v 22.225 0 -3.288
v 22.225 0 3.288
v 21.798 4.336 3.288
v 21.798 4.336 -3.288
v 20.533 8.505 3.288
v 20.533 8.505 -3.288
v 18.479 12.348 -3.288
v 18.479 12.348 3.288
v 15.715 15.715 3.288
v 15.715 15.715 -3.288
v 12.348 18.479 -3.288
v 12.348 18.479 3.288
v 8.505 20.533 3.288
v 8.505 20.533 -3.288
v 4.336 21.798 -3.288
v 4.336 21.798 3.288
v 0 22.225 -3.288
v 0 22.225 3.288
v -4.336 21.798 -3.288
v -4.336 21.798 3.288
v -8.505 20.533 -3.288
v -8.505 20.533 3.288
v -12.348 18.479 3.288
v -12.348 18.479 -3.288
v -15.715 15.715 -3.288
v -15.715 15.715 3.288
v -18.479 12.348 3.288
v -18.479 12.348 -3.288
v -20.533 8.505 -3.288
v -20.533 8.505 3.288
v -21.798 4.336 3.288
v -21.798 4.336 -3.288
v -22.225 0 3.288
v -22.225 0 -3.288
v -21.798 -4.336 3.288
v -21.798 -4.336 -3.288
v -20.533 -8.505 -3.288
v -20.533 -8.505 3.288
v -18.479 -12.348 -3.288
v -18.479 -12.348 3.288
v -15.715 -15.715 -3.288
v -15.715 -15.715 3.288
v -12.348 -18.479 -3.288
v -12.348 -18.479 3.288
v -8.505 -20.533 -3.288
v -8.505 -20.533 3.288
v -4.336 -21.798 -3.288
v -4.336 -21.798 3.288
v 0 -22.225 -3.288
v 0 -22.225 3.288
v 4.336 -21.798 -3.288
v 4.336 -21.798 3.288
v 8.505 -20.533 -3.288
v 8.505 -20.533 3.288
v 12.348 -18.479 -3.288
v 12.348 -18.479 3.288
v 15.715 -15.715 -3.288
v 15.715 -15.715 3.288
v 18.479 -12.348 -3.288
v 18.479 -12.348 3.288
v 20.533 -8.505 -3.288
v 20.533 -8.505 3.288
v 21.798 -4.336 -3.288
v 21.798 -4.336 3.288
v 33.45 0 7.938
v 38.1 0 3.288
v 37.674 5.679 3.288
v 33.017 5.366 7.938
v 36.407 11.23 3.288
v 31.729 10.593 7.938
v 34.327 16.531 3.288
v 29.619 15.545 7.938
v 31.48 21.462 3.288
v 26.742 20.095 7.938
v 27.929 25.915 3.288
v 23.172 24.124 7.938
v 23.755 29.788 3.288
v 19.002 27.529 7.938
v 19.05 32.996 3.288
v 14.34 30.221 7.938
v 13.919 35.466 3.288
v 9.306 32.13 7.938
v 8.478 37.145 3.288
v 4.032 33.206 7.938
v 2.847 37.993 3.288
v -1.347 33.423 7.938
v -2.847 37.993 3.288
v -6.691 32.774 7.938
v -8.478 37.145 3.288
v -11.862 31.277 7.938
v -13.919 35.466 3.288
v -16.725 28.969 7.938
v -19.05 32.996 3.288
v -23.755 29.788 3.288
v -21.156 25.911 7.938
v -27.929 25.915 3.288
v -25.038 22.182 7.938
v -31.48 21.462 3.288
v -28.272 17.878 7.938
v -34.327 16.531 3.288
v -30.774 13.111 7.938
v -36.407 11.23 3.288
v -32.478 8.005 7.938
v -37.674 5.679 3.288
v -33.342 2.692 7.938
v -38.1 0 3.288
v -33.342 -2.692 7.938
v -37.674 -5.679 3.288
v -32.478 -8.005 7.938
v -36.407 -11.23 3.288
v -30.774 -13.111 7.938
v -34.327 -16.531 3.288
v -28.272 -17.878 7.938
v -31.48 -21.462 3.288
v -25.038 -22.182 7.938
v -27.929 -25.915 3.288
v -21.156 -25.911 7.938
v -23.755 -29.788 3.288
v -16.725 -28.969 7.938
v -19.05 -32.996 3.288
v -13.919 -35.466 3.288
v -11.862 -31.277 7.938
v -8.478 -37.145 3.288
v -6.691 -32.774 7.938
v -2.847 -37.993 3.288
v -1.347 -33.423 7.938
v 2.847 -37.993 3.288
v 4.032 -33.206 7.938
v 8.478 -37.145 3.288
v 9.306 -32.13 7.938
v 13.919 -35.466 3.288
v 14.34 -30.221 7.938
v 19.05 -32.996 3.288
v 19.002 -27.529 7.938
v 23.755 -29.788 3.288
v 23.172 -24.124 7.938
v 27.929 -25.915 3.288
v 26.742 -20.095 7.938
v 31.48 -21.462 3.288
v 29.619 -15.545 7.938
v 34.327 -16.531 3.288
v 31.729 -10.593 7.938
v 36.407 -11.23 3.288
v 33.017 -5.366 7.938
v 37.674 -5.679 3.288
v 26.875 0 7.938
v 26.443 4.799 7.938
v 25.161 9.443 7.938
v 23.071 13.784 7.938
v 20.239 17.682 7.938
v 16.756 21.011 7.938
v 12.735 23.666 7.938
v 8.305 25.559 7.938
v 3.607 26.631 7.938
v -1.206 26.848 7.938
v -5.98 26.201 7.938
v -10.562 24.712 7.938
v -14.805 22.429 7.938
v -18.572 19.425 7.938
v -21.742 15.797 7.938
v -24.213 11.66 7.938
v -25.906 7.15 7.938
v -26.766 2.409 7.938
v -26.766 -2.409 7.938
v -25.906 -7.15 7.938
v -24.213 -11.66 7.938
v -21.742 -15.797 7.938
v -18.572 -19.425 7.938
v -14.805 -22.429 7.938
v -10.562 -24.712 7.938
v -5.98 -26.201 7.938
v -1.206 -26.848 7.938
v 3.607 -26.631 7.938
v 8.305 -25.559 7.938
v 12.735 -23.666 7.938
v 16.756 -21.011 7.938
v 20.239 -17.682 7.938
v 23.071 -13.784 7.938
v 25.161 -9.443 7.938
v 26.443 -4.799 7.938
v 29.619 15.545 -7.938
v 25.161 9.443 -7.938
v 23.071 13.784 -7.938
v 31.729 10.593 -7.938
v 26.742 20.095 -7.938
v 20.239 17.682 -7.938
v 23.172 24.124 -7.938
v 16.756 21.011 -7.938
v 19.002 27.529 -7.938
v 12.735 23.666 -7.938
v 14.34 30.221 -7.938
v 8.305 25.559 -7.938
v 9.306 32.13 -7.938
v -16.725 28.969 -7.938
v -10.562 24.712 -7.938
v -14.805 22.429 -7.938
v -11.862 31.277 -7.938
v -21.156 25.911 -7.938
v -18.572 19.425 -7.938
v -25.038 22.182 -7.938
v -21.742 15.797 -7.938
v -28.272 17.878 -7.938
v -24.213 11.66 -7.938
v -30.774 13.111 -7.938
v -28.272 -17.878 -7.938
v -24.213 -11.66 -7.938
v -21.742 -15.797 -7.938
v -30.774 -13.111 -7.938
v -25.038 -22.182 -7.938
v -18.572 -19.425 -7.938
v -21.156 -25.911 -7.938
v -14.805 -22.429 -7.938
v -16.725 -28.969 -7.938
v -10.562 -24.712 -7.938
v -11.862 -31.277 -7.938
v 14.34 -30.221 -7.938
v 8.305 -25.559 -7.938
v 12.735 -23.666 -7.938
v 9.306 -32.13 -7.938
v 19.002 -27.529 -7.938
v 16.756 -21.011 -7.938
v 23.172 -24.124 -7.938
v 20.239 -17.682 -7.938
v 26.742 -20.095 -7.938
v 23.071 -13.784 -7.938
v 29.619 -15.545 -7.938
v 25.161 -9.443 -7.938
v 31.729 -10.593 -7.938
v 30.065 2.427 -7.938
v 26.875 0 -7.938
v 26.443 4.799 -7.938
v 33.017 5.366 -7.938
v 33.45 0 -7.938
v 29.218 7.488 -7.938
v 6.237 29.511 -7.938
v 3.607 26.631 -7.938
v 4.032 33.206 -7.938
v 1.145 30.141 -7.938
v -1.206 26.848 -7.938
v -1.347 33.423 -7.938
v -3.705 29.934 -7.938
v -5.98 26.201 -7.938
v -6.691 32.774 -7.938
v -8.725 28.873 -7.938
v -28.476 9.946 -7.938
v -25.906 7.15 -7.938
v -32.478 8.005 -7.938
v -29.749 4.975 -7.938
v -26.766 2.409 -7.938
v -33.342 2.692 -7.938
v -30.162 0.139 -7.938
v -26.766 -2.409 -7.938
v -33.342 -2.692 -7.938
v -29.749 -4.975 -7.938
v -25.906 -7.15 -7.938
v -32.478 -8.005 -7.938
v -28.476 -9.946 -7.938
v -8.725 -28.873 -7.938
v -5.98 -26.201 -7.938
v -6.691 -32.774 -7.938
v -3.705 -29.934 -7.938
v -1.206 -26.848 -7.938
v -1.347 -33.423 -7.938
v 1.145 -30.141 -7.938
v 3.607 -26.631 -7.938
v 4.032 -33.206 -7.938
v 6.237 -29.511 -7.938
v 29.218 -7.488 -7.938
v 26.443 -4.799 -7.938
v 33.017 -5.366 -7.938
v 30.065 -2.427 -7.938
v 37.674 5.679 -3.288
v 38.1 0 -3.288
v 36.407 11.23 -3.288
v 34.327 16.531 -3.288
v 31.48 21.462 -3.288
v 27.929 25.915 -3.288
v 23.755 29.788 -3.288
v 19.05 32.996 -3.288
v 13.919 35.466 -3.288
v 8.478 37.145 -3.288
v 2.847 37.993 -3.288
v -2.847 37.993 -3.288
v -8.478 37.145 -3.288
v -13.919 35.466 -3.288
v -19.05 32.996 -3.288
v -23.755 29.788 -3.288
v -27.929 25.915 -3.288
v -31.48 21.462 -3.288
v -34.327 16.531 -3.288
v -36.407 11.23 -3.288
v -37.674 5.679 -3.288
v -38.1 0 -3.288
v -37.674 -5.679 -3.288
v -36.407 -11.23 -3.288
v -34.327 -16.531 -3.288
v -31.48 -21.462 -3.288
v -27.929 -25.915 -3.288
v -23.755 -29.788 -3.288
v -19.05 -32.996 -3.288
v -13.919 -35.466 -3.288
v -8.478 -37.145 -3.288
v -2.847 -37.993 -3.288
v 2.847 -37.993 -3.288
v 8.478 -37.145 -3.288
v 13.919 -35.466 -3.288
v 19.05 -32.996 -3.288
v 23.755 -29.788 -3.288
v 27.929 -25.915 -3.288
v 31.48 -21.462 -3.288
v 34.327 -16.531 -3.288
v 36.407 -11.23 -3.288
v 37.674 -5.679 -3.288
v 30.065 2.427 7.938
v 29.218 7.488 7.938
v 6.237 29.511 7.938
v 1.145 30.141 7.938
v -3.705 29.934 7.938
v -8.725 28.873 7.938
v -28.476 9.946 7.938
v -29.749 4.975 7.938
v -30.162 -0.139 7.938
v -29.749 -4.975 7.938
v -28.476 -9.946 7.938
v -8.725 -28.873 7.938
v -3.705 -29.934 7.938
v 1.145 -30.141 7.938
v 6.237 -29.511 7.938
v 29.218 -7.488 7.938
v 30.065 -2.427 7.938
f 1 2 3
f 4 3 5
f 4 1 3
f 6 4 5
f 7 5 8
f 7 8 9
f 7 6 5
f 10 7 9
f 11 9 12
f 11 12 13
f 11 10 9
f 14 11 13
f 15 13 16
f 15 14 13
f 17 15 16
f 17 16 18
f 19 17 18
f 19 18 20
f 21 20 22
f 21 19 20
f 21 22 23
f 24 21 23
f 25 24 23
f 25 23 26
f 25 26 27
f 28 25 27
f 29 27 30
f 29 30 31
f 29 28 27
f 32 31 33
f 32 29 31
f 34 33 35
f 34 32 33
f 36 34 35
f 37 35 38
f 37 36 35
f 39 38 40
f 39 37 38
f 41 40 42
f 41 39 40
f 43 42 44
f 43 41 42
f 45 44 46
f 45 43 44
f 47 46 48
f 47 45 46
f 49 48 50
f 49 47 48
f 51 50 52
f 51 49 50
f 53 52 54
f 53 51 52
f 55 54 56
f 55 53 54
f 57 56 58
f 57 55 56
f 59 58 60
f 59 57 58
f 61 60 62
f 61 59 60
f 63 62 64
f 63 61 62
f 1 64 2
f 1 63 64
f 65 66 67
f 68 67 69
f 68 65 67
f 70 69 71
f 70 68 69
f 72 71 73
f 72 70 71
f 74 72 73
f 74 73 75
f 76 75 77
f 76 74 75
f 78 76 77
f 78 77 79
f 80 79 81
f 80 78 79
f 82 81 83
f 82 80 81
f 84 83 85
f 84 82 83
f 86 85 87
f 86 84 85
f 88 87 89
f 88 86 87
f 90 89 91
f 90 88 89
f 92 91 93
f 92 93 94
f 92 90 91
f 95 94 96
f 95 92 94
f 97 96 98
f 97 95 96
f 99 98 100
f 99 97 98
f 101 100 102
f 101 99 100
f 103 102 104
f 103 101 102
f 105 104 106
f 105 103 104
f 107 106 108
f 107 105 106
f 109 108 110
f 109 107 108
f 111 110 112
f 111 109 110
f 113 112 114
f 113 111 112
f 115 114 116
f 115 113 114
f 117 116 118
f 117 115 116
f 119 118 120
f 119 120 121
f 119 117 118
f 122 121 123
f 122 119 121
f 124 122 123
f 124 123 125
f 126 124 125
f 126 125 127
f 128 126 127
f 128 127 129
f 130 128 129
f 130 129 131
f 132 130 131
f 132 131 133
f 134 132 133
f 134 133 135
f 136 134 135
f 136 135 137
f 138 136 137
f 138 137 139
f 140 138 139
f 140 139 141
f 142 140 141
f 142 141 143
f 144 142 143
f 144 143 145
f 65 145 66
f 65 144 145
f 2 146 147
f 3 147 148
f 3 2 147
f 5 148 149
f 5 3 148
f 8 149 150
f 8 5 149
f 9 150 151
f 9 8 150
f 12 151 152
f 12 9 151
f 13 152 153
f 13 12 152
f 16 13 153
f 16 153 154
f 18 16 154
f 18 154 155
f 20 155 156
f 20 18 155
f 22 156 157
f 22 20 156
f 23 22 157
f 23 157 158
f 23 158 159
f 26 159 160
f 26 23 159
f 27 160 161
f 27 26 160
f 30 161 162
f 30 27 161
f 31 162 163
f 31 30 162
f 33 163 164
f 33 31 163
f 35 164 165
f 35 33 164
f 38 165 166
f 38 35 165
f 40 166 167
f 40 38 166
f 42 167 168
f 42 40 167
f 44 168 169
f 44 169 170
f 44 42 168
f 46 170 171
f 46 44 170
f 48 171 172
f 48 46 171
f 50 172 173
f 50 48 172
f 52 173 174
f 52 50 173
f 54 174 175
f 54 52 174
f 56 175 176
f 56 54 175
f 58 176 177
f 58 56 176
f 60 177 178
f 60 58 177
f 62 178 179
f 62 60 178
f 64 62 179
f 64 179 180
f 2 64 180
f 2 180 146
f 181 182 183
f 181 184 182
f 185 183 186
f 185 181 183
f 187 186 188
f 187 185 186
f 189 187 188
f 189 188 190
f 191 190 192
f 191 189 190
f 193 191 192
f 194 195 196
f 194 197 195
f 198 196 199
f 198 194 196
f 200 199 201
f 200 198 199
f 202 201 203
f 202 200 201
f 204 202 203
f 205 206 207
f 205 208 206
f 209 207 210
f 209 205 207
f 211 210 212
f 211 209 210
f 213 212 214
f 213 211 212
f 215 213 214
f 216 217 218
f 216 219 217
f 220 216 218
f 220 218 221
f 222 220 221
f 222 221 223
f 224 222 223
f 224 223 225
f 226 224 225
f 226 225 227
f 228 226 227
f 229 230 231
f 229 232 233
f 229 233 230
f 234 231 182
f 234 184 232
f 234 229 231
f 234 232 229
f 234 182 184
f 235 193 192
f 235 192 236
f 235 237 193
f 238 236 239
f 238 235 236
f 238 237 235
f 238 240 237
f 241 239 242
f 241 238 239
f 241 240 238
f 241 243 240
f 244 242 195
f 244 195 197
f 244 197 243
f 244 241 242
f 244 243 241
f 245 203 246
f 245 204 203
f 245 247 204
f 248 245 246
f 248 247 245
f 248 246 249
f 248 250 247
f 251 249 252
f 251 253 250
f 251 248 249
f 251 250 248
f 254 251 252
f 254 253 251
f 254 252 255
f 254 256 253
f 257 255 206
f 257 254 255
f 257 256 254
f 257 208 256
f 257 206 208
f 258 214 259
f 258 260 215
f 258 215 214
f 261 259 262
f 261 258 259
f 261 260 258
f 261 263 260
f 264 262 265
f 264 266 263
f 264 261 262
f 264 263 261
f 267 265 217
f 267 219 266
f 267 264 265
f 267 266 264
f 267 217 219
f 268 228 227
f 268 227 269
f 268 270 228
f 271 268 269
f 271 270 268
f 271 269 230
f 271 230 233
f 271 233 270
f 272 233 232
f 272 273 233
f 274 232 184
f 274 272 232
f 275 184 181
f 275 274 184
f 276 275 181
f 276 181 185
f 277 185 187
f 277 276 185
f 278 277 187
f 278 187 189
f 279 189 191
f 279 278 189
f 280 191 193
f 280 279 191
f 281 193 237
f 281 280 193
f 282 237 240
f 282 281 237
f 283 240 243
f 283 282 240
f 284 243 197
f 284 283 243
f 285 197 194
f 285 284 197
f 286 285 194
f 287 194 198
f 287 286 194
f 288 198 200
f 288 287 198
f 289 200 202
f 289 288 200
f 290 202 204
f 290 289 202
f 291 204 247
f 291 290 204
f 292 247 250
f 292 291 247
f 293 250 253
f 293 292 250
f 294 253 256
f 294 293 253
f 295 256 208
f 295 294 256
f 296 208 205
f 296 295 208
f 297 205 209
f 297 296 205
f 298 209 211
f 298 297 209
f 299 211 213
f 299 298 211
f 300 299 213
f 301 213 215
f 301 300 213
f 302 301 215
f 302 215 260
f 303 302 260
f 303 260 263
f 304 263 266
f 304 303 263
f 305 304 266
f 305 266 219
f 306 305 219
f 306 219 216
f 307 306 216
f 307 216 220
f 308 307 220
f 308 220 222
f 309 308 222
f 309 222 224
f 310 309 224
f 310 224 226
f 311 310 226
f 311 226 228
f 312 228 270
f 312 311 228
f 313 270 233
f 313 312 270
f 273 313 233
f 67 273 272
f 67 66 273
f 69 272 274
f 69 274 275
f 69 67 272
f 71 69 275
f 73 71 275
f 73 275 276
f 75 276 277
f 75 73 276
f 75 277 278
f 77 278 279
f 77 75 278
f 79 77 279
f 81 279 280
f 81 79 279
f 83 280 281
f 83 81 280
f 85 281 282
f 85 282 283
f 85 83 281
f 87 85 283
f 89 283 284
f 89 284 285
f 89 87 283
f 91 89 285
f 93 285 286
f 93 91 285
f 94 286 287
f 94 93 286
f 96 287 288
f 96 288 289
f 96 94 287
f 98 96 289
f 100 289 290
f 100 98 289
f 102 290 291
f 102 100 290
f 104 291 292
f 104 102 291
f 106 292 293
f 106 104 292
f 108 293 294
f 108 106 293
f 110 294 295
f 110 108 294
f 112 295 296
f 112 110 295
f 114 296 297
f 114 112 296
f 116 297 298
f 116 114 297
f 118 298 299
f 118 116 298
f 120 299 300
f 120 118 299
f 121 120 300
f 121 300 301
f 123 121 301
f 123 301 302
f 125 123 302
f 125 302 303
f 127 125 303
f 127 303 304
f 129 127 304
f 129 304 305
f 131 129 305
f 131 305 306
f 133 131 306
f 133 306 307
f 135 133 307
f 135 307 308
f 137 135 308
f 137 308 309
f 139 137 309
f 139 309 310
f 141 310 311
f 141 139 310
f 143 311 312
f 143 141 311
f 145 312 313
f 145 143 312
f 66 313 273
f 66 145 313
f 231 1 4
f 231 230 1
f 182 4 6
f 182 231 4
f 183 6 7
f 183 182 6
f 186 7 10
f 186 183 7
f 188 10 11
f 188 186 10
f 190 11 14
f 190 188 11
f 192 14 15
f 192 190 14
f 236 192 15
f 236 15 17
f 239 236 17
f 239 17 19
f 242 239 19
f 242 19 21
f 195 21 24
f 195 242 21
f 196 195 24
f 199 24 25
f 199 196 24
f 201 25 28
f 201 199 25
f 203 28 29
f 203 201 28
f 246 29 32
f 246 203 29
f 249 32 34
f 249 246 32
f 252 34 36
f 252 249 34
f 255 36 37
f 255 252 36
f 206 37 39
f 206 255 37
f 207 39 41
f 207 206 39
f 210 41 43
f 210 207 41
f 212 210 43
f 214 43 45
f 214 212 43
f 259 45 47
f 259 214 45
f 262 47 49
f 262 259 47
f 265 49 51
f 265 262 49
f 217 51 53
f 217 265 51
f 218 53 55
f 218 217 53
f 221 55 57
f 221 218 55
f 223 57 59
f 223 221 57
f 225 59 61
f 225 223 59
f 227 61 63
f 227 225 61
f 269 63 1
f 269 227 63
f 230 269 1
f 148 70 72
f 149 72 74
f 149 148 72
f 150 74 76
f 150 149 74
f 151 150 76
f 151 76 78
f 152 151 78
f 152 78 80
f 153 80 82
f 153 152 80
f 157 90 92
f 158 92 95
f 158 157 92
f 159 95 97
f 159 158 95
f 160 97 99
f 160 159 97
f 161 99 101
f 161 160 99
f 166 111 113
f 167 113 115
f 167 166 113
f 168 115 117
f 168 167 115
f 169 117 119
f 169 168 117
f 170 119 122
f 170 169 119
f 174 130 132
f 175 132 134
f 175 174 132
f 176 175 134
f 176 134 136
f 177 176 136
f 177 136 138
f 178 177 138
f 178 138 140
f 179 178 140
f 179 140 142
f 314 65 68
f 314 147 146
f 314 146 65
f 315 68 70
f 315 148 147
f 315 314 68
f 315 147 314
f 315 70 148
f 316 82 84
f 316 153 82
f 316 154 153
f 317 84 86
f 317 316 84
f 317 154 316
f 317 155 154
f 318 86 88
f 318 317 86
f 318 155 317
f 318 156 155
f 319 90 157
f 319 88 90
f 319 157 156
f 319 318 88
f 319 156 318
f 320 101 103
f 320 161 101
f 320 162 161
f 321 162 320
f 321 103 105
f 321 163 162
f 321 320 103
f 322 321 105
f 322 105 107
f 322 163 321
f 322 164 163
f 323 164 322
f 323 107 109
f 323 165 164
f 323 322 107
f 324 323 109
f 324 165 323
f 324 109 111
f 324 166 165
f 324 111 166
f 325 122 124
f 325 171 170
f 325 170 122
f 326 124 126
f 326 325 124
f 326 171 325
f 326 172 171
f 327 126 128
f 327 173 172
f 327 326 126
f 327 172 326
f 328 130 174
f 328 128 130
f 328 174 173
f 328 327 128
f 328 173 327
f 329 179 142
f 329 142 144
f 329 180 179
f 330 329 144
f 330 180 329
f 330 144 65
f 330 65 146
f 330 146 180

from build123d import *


with BuildPart() as f2:
    # F2: sweep along a path in F0
    with BuildLine(Plane.XY) as f2_path:
        CenterArc((0, 0), 30.1625, 0, 360)
    # F1 (on Front) → F2 (sweep)
    with BuildSketch(Plane.XZ):
        Polygon((26.87468, -7.9375), (33.45032, -7.9375), (38.1, -3.28782), (38.1, 3.28782), (33.45032, 7.9375), (26.87468, 7.9375), (22.225, 3.28782), (22.225, -3.28782), align=None)
    sweep(path=f2_path.line)


solid = f2.part
